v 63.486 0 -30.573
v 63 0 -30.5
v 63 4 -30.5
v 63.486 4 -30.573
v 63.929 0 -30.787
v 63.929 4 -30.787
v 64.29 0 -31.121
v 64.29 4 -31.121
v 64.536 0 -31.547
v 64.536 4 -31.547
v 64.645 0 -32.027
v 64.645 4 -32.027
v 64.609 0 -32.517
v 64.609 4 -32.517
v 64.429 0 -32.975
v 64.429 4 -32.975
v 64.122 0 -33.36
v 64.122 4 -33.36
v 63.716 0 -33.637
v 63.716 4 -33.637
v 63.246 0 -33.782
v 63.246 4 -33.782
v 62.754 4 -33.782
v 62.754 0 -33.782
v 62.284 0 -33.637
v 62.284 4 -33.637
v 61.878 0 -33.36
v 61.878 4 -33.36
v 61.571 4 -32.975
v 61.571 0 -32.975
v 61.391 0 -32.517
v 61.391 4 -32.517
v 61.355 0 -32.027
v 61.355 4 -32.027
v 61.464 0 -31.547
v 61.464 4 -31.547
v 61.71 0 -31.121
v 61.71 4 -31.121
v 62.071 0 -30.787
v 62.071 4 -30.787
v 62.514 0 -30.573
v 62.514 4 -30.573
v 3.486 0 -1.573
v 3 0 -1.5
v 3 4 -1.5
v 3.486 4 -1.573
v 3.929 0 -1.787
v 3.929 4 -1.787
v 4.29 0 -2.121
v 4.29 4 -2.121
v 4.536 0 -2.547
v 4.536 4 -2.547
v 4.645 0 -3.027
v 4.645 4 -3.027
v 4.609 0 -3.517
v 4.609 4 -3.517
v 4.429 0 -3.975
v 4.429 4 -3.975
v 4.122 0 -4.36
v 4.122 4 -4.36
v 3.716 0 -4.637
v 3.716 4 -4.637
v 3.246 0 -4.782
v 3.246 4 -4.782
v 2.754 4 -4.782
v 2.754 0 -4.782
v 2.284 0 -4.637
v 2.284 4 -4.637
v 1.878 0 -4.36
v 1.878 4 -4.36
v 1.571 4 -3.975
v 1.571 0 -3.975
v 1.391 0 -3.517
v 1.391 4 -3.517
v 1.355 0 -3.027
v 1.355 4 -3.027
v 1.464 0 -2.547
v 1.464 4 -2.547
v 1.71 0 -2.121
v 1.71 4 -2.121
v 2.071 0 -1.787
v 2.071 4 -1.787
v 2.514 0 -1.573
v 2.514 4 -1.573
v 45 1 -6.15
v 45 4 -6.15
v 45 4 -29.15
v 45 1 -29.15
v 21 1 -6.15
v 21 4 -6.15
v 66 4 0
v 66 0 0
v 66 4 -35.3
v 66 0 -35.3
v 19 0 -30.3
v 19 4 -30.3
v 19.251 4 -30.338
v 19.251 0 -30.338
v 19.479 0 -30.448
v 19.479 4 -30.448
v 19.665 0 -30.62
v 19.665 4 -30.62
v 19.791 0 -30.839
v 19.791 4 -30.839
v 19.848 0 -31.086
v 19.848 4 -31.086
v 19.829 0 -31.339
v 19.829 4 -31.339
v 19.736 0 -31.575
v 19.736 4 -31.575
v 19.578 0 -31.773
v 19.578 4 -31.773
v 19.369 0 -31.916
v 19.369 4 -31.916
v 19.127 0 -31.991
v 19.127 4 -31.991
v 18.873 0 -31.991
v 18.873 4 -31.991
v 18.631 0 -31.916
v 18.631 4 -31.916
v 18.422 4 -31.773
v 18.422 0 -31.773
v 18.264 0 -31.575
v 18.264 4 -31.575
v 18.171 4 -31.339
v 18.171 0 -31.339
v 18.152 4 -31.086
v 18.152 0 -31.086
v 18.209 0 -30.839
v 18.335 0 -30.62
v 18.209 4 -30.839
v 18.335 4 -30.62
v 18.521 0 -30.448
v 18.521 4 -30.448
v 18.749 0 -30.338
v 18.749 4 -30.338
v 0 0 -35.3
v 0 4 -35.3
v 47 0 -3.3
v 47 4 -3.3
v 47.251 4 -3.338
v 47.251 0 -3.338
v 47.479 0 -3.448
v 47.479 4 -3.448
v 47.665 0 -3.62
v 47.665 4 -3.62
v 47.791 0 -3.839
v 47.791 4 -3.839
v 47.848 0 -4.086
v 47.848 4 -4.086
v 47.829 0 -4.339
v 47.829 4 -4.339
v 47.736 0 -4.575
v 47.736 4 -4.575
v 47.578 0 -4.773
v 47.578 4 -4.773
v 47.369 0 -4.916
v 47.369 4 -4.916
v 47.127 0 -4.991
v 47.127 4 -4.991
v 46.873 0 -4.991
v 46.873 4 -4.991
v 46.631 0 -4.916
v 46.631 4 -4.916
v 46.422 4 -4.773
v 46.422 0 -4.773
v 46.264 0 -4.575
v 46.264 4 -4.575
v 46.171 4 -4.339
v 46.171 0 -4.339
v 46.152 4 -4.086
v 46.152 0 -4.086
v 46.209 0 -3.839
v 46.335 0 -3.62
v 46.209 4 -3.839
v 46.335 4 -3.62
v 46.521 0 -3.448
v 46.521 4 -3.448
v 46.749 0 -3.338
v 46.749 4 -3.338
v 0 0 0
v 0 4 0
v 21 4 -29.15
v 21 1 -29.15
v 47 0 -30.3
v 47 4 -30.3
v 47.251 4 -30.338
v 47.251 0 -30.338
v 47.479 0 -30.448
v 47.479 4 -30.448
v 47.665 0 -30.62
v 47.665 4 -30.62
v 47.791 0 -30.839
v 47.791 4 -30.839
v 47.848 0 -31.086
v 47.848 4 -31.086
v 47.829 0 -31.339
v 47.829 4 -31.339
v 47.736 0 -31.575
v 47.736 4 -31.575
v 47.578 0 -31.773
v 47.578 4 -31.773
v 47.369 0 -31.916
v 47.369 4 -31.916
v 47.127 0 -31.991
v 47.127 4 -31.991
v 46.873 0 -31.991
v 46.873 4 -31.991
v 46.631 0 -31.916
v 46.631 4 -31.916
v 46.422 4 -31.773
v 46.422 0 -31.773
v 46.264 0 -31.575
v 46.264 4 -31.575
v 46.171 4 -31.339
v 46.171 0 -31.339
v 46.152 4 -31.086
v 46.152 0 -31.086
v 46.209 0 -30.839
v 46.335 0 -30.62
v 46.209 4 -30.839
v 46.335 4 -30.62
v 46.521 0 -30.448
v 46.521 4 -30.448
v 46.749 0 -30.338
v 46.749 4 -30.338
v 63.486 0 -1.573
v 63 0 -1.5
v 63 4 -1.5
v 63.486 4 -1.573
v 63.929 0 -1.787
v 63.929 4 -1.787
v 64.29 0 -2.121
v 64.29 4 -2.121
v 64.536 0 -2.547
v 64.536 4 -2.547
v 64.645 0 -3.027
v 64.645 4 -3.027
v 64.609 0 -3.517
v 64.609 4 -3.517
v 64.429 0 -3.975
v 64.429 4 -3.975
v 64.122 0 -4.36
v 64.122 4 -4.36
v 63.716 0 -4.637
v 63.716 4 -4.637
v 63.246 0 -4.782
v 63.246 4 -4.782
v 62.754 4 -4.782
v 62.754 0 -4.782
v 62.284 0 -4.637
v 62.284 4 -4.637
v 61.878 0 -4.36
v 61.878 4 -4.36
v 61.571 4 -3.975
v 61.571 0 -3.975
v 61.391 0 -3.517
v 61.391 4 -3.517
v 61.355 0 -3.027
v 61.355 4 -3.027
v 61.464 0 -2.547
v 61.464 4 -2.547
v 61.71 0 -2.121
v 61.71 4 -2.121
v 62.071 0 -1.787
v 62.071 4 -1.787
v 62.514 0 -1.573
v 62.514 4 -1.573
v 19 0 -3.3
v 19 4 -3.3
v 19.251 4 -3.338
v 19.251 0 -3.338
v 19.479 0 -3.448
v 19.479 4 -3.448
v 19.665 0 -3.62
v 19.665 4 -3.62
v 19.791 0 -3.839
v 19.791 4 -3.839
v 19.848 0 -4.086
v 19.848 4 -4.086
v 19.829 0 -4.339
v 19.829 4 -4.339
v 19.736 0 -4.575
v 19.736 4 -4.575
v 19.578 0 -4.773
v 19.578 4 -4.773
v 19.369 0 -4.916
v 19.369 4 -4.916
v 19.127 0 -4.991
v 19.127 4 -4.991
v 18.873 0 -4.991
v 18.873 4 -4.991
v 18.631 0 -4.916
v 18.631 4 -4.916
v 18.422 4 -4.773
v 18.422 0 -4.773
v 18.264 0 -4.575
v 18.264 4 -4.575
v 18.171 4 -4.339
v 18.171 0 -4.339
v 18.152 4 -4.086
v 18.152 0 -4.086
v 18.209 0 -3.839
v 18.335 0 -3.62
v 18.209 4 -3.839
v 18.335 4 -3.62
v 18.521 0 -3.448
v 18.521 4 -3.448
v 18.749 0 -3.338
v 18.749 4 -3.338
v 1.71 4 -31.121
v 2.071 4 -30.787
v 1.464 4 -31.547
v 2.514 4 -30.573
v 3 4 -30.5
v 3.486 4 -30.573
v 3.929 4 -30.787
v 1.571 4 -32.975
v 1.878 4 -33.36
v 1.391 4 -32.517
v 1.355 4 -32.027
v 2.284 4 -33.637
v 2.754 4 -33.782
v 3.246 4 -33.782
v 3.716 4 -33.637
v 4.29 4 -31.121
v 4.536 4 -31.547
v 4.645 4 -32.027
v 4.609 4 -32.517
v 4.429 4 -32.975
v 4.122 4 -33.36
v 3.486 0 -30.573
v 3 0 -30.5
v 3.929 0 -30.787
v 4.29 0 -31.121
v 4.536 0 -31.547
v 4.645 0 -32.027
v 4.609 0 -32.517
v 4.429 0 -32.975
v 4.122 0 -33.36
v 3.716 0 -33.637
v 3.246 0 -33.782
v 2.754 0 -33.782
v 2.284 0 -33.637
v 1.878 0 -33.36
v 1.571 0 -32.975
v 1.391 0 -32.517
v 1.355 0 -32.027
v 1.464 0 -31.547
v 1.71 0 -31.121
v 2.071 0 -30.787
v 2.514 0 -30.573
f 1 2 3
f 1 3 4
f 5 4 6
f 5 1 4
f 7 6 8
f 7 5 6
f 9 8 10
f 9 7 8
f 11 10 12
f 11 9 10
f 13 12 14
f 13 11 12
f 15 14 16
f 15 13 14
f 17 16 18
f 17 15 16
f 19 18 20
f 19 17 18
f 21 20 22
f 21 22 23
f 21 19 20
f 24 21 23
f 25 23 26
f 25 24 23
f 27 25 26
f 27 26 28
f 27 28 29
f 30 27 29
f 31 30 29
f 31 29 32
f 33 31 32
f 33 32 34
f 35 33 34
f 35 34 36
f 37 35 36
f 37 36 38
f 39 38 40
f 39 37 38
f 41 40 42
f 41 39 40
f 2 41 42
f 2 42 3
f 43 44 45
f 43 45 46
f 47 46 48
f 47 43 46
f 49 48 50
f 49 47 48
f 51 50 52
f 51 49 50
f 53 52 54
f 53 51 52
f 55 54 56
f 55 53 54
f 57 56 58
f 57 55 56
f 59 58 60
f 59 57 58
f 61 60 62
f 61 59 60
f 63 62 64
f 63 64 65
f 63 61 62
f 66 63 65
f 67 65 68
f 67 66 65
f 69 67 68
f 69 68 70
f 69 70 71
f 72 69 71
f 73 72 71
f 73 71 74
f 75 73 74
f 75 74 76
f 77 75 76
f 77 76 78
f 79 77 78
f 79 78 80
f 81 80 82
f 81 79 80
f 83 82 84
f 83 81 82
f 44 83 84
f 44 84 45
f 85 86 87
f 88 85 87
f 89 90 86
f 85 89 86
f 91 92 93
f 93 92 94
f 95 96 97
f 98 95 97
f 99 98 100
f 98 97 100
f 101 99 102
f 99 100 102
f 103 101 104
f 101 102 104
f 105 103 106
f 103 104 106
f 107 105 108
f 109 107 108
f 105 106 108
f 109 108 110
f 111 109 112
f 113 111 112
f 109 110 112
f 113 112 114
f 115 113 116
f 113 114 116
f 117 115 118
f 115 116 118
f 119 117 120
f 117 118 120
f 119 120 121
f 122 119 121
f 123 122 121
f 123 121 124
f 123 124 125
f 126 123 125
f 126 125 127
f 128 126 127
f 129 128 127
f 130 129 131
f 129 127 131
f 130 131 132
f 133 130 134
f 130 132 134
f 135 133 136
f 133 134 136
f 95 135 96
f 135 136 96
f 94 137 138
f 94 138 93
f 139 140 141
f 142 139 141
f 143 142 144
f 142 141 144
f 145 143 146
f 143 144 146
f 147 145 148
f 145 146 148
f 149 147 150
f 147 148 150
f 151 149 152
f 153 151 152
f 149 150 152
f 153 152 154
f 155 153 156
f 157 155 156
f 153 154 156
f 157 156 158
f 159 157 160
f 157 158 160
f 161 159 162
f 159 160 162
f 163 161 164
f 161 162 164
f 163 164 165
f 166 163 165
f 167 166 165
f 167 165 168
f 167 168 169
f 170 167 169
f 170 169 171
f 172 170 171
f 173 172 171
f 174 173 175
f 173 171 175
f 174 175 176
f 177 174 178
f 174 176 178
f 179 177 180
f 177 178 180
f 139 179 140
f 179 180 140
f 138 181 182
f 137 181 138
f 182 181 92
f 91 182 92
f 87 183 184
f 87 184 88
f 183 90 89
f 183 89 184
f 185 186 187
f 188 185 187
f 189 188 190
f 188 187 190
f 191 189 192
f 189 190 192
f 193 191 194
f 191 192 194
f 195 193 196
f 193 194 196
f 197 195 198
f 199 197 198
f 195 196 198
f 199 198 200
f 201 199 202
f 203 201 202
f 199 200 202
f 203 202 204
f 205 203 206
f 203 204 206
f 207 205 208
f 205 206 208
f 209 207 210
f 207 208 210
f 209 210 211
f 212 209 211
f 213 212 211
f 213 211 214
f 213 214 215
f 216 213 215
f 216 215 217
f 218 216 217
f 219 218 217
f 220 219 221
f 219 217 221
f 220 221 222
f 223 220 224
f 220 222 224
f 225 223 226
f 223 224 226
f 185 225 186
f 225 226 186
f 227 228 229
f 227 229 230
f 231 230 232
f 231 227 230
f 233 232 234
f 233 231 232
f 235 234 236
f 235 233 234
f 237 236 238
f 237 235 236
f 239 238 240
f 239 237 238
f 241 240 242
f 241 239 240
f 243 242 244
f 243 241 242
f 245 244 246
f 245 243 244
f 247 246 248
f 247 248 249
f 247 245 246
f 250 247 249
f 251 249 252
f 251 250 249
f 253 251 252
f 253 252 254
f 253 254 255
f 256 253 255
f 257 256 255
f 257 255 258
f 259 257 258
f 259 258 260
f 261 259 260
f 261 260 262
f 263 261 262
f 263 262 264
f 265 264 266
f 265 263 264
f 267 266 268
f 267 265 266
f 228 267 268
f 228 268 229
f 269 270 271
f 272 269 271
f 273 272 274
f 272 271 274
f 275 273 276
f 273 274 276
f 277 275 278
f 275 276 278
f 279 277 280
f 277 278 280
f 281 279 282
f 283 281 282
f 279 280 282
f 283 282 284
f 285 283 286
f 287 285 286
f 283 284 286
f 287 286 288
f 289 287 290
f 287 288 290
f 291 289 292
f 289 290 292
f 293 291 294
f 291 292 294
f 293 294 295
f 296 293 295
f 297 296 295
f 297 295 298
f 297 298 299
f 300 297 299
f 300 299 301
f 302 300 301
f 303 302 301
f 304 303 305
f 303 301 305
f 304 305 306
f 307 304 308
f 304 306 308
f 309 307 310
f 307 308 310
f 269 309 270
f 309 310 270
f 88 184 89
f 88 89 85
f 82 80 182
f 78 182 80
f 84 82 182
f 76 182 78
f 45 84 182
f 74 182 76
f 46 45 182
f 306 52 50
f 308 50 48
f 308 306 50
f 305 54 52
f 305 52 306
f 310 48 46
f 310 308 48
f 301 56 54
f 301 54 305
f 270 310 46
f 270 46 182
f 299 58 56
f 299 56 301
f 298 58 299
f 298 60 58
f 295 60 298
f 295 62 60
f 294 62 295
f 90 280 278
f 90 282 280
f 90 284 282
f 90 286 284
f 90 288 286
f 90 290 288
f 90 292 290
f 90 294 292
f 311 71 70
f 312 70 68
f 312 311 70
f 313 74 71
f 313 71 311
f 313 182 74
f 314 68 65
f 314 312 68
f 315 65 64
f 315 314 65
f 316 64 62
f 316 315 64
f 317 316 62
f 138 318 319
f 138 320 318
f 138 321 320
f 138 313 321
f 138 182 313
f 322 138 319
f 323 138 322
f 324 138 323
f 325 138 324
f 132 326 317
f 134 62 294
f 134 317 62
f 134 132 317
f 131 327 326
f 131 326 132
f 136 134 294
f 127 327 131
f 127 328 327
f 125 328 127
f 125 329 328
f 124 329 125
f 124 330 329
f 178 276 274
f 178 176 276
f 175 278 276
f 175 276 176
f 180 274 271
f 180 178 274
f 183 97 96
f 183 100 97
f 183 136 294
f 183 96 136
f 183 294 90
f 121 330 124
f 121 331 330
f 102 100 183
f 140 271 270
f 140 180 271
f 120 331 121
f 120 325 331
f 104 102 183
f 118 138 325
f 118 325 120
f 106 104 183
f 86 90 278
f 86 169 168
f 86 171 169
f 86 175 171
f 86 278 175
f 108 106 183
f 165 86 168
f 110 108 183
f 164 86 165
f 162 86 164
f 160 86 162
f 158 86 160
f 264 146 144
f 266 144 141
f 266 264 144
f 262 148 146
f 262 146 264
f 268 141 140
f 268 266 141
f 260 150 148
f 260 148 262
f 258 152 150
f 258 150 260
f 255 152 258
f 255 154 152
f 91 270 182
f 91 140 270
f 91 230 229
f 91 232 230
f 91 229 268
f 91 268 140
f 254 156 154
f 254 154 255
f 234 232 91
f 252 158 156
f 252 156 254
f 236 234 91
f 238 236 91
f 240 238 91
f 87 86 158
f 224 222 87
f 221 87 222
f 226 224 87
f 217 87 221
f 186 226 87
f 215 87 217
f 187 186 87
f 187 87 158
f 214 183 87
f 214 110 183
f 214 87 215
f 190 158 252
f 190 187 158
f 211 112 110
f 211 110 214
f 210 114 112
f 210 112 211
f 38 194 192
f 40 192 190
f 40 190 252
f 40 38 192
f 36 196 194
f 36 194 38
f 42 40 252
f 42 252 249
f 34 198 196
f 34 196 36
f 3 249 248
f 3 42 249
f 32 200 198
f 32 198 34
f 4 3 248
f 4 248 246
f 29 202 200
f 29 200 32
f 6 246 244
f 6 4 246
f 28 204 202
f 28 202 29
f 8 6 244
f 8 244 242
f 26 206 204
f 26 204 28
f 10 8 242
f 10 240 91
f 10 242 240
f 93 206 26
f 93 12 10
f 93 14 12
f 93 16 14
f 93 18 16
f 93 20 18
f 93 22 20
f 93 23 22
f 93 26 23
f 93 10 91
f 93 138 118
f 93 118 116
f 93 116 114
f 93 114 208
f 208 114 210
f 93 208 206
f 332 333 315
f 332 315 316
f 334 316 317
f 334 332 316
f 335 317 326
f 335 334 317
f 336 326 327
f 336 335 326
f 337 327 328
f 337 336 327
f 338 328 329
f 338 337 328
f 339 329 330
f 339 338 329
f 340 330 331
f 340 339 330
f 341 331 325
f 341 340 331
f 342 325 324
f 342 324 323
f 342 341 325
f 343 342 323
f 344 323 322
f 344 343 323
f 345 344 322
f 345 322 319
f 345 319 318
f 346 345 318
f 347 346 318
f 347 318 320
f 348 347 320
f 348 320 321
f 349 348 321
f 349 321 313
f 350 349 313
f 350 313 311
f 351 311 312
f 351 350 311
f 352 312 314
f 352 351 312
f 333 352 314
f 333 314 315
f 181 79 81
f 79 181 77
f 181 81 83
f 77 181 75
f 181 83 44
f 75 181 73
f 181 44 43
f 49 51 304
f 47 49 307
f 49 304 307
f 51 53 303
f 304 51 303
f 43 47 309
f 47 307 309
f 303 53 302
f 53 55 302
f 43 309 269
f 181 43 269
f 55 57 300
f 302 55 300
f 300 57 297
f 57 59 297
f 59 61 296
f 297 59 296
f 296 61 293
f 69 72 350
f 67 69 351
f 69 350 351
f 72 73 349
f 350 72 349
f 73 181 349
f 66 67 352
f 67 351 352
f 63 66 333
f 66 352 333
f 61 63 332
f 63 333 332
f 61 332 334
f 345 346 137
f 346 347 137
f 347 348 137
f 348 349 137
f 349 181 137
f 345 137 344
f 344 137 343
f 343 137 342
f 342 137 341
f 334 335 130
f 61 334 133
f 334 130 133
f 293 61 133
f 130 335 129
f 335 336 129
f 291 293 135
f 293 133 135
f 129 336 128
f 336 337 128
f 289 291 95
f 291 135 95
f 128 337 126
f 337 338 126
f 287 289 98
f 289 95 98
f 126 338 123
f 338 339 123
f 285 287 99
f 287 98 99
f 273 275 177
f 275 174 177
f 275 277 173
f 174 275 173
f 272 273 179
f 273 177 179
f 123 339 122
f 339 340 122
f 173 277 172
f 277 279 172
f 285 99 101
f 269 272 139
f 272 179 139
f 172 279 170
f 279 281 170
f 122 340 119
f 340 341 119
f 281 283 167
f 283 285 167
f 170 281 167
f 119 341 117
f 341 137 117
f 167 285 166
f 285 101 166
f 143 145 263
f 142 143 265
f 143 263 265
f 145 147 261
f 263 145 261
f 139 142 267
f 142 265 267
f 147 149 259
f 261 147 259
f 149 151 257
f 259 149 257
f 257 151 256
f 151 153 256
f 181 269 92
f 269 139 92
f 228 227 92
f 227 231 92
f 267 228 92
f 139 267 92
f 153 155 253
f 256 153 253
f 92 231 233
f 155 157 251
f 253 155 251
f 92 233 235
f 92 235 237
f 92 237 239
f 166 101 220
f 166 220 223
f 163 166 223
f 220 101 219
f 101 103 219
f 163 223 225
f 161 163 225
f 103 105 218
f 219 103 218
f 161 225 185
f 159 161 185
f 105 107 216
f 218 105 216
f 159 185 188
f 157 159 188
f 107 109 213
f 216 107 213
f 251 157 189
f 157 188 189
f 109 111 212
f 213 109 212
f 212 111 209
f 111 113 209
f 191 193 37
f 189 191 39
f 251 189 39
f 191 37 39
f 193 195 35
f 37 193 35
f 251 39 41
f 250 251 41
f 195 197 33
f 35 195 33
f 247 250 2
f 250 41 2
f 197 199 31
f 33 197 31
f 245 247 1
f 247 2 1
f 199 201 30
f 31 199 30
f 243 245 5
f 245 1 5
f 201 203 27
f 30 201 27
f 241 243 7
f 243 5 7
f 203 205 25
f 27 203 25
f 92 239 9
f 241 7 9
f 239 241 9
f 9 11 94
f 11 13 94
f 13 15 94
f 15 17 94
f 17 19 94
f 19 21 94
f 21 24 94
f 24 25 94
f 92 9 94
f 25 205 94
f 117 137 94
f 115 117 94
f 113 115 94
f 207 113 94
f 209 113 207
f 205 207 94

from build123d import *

# Parameters (mm, degrees)
SKETCH1_W           = 66
SKETCH1_H           = 35.3
SKETCH1_R           = 1.65
BOSS_EXTRUDE1_DEPTH = 4
SKETCH2_R           = 0.85
CUT_EXTRUDE1_DEPTH  = 4
SKETCH3_W           = 24
SKETCH3_H           = 23
CUT_EXTRUDE2_DEPTH  = 3


with BuildPart() as part:
    # Sketch1 → Boss-Extrude1 (new body)
    with BuildSketch(Plane(origin=(0, 0, 0), x_dir=(1, 0, 0), z_dir=(0, 1, 0))):
        with Locations((33, 17.65)):
            Rectangle(SKETCH1_W, SKETCH1_H)
        with Locations(Location((3, 32.15, 0), (0, 0, 270))):
            Circle(SKETCH1_R, mode=Mode.SUBTRACT)
        with Locations(Location((3, 3.15, 0), (0, 0, 270))):
            Circle(SKETCH1_R, mode=Mode.SUBTRACT)
        with Locations(Location((63, 3.15, 0), (0, 0, 270))):
            Circle(SKETCH1_R, mode=Mode.SUBTRACT)
        with Locations(Location((63, 32.15, 0), (0, 0, 270))):
            Circle(SKETCH1_R, mode=Mode.SUBTRACT)
    extrude(amount=BOSS_EXTRUDE1_DEPTH)

    # Sketch2 → Cut-Extrude1 (cut)
    with BuildSketch(Plane(origin=(0, 4, 0), x_dir=(1, 0, 0), z_dir=(0, 1, 0))):
        with Locations(Location((19, 31.15, 0), (0, 0, 270))):
            Circle(SKETCH2_R)
        with Locations(Location((47, 31.15, 0), (0, 0, 270))):
            Circle(SKETCH2_R)
        with Locations(Location((47, 4.15, 0), (0, 0, 270))):
            Circle(SKETCH2_R)
        with Locations(Location((19, 4.15, 0), (0, 0, 270))):
            Circle(SKETCH2_R)
    extrude(amount=-CUT_EXTRUDE1_DEPTH, mode=Mode.SUBTRACT)

    # Sketch3 → Cut-Extrude2 (cut)
    with BuildSketch(Plane(origin=(0, 4, 0), x_dir=(1, 0, 0), z_dir=(0, 1, 0))):
        with Locations((33, 17.65)):
            Rectangle(SKETCH3_W, SKETCH3_H)
    extrude(amount=-CUT_EXTRUDE2_DEPTH, mode=Mode.SUBTRACT)


solid = part.part
